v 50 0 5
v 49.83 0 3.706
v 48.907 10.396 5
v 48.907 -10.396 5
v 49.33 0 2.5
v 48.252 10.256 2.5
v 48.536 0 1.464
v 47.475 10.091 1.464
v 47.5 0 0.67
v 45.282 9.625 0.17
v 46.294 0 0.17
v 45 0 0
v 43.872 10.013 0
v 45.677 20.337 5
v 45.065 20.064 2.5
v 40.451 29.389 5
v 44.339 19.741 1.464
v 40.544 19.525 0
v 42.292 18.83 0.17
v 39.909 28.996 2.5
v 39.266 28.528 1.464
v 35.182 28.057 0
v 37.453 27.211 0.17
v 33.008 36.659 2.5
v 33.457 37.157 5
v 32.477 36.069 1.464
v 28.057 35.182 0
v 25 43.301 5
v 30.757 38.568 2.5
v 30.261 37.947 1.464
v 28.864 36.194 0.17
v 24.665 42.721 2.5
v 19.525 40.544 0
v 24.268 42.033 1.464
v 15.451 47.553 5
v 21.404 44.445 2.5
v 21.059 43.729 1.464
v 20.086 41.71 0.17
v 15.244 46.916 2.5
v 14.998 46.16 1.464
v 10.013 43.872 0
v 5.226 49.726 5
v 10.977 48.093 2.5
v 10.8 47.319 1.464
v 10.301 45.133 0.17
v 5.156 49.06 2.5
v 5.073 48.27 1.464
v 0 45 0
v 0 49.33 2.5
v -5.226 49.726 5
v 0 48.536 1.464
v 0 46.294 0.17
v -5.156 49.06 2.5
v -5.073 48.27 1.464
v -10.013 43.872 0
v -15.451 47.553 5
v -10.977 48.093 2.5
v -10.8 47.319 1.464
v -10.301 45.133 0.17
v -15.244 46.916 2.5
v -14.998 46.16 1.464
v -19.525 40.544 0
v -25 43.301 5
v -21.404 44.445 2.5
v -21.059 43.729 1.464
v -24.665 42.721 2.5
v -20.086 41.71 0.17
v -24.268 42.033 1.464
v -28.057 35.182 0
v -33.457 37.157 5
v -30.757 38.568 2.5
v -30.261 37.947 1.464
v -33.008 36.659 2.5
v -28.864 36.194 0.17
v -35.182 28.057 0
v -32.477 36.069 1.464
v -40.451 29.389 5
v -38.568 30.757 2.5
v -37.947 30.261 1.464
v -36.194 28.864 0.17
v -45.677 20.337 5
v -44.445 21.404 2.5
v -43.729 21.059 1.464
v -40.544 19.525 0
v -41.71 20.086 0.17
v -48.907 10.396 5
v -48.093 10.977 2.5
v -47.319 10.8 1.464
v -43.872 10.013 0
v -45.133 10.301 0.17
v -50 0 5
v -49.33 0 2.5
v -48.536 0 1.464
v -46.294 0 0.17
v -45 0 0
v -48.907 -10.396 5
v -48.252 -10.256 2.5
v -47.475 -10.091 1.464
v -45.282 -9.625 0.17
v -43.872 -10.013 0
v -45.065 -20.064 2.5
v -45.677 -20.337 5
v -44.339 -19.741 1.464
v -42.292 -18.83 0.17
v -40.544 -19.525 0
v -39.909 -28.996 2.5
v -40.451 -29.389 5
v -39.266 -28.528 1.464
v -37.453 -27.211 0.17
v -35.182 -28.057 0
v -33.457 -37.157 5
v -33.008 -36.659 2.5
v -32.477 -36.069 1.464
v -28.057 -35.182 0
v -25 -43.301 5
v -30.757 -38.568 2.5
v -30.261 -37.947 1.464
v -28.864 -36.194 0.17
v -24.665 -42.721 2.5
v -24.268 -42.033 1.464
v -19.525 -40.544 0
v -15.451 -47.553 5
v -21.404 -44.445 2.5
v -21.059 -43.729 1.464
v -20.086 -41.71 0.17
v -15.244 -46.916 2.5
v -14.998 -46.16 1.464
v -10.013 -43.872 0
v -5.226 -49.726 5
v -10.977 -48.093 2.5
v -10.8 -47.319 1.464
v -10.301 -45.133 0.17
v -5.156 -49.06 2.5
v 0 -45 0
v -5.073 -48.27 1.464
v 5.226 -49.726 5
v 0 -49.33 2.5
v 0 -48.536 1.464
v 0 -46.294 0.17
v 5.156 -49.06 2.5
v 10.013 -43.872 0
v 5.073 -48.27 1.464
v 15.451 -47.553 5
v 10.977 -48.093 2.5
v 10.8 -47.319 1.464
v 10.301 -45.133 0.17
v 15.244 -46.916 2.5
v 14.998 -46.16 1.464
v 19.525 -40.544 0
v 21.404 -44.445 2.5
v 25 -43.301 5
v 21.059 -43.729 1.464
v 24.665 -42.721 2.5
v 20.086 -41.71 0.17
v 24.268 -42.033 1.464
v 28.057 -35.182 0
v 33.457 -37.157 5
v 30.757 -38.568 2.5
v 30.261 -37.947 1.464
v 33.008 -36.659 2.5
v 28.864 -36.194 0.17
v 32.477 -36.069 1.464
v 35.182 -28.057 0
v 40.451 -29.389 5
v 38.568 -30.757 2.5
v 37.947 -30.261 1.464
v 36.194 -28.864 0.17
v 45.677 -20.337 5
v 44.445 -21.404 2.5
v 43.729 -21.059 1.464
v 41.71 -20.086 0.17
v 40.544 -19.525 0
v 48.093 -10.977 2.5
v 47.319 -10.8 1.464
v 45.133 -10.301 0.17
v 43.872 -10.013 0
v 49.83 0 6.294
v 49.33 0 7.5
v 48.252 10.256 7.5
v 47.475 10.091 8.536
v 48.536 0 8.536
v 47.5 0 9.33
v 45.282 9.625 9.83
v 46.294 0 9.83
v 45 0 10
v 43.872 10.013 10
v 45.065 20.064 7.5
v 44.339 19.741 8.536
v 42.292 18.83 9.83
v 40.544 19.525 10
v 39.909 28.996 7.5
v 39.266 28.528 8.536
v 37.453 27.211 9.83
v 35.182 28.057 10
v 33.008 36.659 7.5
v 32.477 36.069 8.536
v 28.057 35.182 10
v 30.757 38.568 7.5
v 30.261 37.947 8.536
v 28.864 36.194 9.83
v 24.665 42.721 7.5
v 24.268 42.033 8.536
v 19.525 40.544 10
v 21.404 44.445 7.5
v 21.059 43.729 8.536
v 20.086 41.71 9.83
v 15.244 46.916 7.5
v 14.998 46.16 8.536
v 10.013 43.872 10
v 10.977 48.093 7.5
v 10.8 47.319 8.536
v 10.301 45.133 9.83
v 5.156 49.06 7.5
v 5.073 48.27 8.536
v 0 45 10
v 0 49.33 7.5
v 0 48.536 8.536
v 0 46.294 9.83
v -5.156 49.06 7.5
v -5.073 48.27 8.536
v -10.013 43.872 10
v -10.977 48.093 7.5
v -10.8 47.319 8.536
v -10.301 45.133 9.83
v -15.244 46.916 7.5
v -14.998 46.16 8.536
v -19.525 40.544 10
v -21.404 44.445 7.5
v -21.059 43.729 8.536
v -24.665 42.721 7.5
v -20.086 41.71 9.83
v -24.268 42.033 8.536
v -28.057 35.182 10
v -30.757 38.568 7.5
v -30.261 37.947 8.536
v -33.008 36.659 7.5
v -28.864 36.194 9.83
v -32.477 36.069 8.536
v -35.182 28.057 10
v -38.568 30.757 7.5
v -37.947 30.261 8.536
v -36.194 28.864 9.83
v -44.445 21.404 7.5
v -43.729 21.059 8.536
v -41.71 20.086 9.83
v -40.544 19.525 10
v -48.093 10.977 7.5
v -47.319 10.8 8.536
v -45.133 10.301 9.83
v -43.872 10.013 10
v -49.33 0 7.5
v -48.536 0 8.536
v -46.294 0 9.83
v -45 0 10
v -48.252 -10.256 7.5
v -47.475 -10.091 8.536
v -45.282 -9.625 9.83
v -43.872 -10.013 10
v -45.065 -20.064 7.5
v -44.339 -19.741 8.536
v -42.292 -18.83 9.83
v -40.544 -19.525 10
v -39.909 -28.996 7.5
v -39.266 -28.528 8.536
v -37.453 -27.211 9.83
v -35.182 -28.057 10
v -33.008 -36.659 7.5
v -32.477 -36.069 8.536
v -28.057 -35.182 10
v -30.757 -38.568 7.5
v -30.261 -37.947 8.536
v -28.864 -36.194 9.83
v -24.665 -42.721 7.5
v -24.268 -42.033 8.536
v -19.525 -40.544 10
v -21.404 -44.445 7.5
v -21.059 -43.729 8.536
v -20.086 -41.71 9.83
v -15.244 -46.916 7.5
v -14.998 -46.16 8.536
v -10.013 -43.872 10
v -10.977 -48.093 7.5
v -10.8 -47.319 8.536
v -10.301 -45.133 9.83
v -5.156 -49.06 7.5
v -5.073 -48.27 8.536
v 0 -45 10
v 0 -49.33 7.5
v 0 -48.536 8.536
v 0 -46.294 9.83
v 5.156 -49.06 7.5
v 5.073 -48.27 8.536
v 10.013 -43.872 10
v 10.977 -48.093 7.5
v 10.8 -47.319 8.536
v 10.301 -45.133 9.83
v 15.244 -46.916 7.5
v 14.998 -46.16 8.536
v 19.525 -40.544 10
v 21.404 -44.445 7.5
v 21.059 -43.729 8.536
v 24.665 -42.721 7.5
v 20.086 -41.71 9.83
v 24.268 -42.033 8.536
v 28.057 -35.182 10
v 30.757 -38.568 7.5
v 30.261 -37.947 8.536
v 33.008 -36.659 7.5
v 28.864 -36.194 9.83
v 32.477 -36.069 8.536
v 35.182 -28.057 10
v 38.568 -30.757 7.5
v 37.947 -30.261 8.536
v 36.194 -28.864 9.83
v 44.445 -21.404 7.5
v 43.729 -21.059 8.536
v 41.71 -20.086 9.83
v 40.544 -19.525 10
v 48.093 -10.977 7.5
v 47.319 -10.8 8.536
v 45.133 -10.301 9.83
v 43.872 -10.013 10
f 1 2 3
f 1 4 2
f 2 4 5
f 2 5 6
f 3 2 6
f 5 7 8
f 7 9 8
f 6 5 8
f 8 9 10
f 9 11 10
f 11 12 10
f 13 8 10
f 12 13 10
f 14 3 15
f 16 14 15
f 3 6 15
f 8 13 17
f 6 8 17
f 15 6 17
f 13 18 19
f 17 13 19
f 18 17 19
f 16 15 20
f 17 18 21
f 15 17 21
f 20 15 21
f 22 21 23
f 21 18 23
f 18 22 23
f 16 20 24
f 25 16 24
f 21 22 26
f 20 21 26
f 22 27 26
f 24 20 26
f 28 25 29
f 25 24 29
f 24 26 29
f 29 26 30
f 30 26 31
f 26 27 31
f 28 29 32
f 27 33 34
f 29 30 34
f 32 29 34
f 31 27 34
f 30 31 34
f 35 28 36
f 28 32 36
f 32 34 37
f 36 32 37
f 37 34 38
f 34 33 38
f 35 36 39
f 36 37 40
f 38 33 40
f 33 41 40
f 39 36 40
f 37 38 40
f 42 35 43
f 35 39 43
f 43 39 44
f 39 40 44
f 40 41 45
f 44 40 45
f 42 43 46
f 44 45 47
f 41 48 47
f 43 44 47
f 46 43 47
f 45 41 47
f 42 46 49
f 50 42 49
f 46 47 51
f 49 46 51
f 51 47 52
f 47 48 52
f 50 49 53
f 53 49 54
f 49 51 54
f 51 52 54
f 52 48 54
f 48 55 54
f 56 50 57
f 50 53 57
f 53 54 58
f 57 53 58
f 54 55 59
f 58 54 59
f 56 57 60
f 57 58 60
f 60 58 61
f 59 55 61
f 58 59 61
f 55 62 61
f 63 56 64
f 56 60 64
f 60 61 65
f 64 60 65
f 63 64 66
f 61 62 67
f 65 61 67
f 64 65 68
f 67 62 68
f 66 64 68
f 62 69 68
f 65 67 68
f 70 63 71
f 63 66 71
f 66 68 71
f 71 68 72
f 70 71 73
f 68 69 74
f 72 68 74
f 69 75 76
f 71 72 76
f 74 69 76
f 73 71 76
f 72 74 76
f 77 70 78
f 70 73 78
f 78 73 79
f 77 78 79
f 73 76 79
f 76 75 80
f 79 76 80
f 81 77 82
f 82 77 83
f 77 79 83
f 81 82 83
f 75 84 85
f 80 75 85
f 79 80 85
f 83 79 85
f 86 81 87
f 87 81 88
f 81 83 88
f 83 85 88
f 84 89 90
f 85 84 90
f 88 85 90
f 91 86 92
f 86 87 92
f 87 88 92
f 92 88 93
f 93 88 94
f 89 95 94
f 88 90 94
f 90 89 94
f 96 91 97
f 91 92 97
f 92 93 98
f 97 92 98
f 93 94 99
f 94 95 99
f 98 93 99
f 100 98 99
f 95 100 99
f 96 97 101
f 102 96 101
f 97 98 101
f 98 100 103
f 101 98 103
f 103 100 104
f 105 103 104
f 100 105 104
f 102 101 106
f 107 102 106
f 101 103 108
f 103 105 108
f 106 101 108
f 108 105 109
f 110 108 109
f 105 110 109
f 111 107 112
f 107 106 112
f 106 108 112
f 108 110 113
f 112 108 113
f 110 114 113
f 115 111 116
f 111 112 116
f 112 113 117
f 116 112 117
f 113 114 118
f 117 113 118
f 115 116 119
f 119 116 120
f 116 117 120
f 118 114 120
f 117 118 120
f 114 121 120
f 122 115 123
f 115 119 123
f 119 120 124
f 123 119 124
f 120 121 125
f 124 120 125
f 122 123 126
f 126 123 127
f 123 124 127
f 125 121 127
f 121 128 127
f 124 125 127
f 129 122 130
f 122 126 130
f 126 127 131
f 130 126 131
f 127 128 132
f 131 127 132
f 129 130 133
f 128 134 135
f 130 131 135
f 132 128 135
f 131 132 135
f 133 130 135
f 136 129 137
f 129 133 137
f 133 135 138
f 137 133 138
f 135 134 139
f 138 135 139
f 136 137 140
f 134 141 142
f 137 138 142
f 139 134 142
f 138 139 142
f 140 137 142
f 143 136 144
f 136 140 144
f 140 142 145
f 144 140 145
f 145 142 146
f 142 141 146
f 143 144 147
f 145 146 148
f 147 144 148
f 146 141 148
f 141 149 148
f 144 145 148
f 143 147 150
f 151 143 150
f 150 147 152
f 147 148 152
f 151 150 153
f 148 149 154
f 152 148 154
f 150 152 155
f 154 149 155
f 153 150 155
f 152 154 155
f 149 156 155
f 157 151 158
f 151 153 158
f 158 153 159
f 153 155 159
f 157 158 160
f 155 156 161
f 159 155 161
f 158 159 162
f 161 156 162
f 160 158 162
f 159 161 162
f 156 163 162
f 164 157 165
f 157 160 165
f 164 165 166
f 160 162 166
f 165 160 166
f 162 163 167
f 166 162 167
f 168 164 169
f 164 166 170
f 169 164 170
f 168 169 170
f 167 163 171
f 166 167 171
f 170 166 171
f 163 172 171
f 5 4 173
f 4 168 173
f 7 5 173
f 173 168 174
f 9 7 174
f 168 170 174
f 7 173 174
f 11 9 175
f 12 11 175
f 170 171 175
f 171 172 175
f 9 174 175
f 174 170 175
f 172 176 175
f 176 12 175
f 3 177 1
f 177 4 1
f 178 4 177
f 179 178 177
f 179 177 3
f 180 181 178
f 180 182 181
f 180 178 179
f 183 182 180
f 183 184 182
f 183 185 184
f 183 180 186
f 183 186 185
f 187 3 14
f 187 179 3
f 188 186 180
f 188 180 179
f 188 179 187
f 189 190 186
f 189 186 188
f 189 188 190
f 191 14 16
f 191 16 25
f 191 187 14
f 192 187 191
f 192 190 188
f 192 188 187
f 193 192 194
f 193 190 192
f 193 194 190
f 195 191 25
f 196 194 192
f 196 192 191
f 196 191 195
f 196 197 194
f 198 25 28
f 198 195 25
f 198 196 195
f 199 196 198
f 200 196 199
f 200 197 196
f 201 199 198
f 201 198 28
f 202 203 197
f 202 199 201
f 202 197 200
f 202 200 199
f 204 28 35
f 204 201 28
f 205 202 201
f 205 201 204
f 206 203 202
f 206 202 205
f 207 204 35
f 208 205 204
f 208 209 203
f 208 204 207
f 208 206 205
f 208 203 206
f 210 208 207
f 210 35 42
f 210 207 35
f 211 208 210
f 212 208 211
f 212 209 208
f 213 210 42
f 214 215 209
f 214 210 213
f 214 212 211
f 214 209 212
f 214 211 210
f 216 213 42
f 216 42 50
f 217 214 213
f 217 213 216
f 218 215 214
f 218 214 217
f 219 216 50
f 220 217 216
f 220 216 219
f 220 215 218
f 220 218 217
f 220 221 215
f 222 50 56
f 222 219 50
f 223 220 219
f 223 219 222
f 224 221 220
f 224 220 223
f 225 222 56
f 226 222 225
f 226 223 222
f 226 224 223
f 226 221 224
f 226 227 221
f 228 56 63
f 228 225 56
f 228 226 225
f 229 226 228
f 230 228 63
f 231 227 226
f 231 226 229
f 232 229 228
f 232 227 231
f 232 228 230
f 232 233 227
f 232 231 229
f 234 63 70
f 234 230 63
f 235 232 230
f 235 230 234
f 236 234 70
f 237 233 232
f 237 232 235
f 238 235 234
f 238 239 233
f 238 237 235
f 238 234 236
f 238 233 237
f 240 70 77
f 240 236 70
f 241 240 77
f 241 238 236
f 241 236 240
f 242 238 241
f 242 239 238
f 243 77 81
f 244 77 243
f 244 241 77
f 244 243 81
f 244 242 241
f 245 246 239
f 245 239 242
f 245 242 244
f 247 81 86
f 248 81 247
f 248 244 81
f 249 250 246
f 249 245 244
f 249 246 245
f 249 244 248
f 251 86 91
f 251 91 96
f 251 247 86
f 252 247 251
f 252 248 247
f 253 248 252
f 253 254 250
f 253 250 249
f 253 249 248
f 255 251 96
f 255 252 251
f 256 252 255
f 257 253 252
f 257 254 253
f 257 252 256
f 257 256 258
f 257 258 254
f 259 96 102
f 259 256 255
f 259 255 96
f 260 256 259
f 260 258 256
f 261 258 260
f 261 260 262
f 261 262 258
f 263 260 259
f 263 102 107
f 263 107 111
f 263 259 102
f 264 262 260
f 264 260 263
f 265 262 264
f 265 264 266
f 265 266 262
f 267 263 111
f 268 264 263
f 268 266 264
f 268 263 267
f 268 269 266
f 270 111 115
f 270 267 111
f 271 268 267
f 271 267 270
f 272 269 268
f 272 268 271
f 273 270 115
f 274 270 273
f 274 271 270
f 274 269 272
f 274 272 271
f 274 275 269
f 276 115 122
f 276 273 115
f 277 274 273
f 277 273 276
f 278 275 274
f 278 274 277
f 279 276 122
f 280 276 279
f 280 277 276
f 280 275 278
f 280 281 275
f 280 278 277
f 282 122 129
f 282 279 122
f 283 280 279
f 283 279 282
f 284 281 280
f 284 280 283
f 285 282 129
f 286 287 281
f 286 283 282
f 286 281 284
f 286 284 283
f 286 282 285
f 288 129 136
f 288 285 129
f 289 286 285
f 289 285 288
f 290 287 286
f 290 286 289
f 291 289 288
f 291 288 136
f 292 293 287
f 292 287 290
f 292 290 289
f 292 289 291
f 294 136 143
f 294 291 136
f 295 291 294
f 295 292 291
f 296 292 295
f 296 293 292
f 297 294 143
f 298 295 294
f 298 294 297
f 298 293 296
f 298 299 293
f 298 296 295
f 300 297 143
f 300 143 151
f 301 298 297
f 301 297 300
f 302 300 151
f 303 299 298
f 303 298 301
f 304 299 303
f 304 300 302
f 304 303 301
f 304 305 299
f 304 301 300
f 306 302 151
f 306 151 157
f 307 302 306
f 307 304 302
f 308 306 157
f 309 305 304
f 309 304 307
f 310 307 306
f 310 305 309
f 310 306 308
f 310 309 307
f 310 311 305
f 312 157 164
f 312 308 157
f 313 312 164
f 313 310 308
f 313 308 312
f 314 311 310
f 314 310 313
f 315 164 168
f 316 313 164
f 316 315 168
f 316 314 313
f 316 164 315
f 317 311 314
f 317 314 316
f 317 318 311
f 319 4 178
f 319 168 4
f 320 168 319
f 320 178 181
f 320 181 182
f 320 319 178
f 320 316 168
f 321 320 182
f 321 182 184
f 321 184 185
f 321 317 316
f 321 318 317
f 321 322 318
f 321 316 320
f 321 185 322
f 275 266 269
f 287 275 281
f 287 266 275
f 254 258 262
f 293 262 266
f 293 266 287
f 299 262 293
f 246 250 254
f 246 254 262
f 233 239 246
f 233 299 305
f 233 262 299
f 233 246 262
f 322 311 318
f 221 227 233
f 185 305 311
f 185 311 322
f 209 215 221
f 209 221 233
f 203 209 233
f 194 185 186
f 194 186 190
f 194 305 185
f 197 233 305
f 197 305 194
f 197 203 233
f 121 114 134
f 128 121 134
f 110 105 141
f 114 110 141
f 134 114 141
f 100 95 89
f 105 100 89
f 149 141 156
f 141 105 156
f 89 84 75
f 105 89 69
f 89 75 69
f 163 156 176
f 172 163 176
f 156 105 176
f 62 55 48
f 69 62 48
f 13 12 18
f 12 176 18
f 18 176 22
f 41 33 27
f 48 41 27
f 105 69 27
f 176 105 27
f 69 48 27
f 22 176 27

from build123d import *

# Parameters (mm, degrees)
F0_R     = 50
F1_DEPTH = 10
F2_R     = 5
F3_R     = 4.99999


# Not quite as in the source:
# - a fillet or chamfer is up to 0.001 mm smaller than in the source, because OpenCascade refuses the exact size


with BuildPart() as f1:
    # F0 (on Top) → F1 (new body)
    with BuildSketch(Plane.XY):
        Circle(F0_R)
    extrude(amount=F1_DEPTH)

    # F2
    f2_edges = [f1.edges().sort_by_distance(p)[0] for p in [
        (-50, 0, 10),
    ]]
    fillet(f2_edges, radius=F2_R)

    # F3 (radius 5 in the source; OpenCascade refuses exactly that, so slightly less here)
    f3_edges = [f1.edges().sort_by_distance(p)[0] for p in [
        (-50, 0, 0),
    ]]
    fillet(f3_edges, radius=F3_R)


solid = f1.part
